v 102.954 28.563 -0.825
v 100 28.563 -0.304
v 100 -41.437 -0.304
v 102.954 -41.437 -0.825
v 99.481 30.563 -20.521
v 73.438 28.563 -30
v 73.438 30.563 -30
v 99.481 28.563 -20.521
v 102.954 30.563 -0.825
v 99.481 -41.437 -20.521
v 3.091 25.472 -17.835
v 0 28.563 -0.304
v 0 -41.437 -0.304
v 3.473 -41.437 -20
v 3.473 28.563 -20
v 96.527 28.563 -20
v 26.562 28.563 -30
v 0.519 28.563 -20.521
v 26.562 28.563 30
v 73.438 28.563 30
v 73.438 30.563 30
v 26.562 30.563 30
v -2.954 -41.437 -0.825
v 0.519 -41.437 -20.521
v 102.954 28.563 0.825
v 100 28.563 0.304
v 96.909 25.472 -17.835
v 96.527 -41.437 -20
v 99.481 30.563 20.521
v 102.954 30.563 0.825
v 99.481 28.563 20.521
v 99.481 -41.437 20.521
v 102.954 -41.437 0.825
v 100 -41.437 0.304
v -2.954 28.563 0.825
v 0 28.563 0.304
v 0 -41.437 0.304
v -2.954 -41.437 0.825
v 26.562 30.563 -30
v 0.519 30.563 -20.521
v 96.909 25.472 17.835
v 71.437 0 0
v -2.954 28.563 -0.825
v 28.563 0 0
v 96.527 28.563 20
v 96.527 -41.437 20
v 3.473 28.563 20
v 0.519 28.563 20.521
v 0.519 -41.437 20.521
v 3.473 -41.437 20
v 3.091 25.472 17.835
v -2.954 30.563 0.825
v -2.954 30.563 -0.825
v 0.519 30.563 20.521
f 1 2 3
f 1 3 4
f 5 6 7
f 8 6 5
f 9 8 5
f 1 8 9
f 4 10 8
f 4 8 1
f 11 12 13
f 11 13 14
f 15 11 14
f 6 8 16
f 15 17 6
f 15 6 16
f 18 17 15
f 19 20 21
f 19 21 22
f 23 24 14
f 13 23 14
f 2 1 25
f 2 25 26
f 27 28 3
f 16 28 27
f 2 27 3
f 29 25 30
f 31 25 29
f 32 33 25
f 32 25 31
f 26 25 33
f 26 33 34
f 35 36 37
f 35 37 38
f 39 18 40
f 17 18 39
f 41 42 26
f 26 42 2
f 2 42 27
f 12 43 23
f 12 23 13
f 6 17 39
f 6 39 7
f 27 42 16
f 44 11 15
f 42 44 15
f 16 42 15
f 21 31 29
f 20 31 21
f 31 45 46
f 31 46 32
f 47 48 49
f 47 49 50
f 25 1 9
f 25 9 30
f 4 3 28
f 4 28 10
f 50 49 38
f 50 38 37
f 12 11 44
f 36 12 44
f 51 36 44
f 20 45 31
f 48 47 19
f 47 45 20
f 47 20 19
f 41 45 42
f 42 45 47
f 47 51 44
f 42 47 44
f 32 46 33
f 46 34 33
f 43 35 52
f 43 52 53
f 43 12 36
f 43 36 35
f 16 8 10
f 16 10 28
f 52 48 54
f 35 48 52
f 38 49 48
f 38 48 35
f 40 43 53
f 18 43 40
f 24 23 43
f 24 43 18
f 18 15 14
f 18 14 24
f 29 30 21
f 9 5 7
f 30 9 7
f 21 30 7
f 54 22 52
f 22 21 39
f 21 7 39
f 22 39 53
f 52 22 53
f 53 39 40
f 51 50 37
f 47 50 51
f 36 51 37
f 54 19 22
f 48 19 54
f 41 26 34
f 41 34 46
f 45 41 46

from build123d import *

# Parameters (mm, degrees)
BOSS_EXTRUDE1_DEPTH   = 100
CUT_EXTRUDE1_START    = -28.129025
CUT_EXTRUDE1_DEPTH    = 28.129025
BOSS_EXTRUDE2_DEPTH   = 70
BOSS_EXTRUDE2_2_DEPTH = 70
BOSS_EXTRUDE2_3_DEPTH = 70
BOSS_EXTRUDE2_4_DEPTH = 70
CUT_EXTRUDE2_START    = -20.520945
CUT_EXTRUDE2_DEPTH    = 38.356397
BOSS_EXTRUDE4_DEPTH   = 2


with BuildPart() as part:
    # Sketch2 → Boss-Extrude1 (new body)
    with BuildSketch(Plane(origin=(0, 0, 0), x_dir=(0, 0, -1), z_dir=(1, 0, 0))):
        Polygon((0, 0), (20, 28.562960135), (-20, 28.562960135), align=None)
    extrude(amount=BOSS_EXTRUDE1_DEPTH)

    # Sketch3 → Cut-Extrude1 (cut)
    with BuildSketch(Plane(origin=(0, 28.562960135, 0), x_dir=(1, 0, 0), z_dir=(0, 1, 0)).offset(CUT_EXTRUDE1_START)):
        Polygon((96.527036447, 20), (100, 0.30384494), (100, 20), align=None)
        Polygon((0, 0.30384494), (3.472963553, 20), (0, 20), align=None)
        Polygon((96.527036447, -20), (100, -0.30384494), (100, -20), align=None)
        Polygon((0, -0.30384494), (3.472963553, -20), (0, -20), align=None)
    extrude(amount=CUT_EXTRUDE1_DEPTH, mode=Mode.SUBTRACT)

    # Sketch7 → Cut-Extrude2 (cut)
    with BuildSketch(Plane.XY.offset(CUT_EXTRUDE2_START)):
        Polygon((0, 28.562960135), (28.562960135, 0), (0, 0), align=None)
        Polygon((100, 28.562960135), (100, 0), (71.437039865, 0), align=None)
    extrude(amount=CUT_EXTRUDE2_DEPTH, mode=Mode.SUBTRACT)



with BuildPart() as body_2:
    # Sketch4 → Boss-Extrude2 (new body)
    with BuildSketch(Plane(origin=(0, 28.562960135, 0), x_dir=(1, 0, 0), z_dir=(0, 1, 0))):
        Polygon((3.472963553, 20), (0.518540294, 20.520944533), (-2.954423259, 0.824789473), (0, 0.30384494), align=None)
    extrude(amount=-BOSS_EXTRUDE2_DEPTH)


with BuildPart() as body_3:
    # Sketch4 → Boss-Extrude2 2 (new body)
    with BuildSketch(Plane(origin=(0, 28.562960135, 0), x_dir=(1, 0, 0), z_dir=(0, 1, 0))):
        Polygon((96.527036447, 20), (100, 0.30384494), (102.954423259, 0.824789473), (99.481459706, 20.520944533), align=None)
    extrude(amount=-BOSS_EXTRUDE2_2_DEPTH)


with BuildPart() as body_4:
    # Sketch4 → Boss-Extrude2 3 (new body)
    with BuildSketch(Plane(origin=(0, 28.562960135, 0), x_dir=(1, 0, 0), z_dir=(0, 1, 0))):
        Polygon((96.527036447, -20), (99.481459706, -20.520944533), (102.954423259, -0.824789473), (100, -0.30384494), align=None)
    extrude(amount=-BOSS_EXTRUDE2_3_DEPTH)


with BuildPart() as body_5:
    # Sketch4 → Boss-Extrude2 4 (new body)
    with BuildSketch(Plane(origin=(0, 28.562960135, 0), x_dir=(1, 0, 0), z_dir=(0, 1, 0))):
        Polygon((3.472963553, -20), (0, -0.30384494), (-2.954423259, -0.824789473), (0.518540294, -20.520944533), align=None)
    extrude(amount=-BOSS_EXTRUDE2_4_DEPTH)


with BuildPart() as part_1:
    add(part.part)

    add(body_2.part)  # Boss-Extrude4 merges body 2

    add(body_3.part)  # Boss-Extrude4 merges body 3

    add(body_4.part)  # Boss-Extrude4 merges body 4

    add(body_5.part)  # Boss-Extrude4 merges body 5
    # Sketch8 → Boss-Extrude4 (add)
    with BuildSketch(Plane(origin=(0, 28.562960135, 0), x_dir=(1, 0, 0), z_dir=(0, 1, 0))):
        Polygon((0.518540294, 20.520944533), (26.562031148, 30), (73.437968852, 30), (99.481459706, 20.520944533), (102.954423259, 0.824789473), (102.954423259, -0.824789473), (99.481459706, -20.520944533), (73.437968852, -30), (26.562031148, -30), (0.518540294, -20.520944533), (-2.954423259, -0.824789473), (-2.954423259, 0.824789473), align=None)
    extrude(amount=BOSS_EXTRUDE4_DEPTH)


solid = part_1.part
